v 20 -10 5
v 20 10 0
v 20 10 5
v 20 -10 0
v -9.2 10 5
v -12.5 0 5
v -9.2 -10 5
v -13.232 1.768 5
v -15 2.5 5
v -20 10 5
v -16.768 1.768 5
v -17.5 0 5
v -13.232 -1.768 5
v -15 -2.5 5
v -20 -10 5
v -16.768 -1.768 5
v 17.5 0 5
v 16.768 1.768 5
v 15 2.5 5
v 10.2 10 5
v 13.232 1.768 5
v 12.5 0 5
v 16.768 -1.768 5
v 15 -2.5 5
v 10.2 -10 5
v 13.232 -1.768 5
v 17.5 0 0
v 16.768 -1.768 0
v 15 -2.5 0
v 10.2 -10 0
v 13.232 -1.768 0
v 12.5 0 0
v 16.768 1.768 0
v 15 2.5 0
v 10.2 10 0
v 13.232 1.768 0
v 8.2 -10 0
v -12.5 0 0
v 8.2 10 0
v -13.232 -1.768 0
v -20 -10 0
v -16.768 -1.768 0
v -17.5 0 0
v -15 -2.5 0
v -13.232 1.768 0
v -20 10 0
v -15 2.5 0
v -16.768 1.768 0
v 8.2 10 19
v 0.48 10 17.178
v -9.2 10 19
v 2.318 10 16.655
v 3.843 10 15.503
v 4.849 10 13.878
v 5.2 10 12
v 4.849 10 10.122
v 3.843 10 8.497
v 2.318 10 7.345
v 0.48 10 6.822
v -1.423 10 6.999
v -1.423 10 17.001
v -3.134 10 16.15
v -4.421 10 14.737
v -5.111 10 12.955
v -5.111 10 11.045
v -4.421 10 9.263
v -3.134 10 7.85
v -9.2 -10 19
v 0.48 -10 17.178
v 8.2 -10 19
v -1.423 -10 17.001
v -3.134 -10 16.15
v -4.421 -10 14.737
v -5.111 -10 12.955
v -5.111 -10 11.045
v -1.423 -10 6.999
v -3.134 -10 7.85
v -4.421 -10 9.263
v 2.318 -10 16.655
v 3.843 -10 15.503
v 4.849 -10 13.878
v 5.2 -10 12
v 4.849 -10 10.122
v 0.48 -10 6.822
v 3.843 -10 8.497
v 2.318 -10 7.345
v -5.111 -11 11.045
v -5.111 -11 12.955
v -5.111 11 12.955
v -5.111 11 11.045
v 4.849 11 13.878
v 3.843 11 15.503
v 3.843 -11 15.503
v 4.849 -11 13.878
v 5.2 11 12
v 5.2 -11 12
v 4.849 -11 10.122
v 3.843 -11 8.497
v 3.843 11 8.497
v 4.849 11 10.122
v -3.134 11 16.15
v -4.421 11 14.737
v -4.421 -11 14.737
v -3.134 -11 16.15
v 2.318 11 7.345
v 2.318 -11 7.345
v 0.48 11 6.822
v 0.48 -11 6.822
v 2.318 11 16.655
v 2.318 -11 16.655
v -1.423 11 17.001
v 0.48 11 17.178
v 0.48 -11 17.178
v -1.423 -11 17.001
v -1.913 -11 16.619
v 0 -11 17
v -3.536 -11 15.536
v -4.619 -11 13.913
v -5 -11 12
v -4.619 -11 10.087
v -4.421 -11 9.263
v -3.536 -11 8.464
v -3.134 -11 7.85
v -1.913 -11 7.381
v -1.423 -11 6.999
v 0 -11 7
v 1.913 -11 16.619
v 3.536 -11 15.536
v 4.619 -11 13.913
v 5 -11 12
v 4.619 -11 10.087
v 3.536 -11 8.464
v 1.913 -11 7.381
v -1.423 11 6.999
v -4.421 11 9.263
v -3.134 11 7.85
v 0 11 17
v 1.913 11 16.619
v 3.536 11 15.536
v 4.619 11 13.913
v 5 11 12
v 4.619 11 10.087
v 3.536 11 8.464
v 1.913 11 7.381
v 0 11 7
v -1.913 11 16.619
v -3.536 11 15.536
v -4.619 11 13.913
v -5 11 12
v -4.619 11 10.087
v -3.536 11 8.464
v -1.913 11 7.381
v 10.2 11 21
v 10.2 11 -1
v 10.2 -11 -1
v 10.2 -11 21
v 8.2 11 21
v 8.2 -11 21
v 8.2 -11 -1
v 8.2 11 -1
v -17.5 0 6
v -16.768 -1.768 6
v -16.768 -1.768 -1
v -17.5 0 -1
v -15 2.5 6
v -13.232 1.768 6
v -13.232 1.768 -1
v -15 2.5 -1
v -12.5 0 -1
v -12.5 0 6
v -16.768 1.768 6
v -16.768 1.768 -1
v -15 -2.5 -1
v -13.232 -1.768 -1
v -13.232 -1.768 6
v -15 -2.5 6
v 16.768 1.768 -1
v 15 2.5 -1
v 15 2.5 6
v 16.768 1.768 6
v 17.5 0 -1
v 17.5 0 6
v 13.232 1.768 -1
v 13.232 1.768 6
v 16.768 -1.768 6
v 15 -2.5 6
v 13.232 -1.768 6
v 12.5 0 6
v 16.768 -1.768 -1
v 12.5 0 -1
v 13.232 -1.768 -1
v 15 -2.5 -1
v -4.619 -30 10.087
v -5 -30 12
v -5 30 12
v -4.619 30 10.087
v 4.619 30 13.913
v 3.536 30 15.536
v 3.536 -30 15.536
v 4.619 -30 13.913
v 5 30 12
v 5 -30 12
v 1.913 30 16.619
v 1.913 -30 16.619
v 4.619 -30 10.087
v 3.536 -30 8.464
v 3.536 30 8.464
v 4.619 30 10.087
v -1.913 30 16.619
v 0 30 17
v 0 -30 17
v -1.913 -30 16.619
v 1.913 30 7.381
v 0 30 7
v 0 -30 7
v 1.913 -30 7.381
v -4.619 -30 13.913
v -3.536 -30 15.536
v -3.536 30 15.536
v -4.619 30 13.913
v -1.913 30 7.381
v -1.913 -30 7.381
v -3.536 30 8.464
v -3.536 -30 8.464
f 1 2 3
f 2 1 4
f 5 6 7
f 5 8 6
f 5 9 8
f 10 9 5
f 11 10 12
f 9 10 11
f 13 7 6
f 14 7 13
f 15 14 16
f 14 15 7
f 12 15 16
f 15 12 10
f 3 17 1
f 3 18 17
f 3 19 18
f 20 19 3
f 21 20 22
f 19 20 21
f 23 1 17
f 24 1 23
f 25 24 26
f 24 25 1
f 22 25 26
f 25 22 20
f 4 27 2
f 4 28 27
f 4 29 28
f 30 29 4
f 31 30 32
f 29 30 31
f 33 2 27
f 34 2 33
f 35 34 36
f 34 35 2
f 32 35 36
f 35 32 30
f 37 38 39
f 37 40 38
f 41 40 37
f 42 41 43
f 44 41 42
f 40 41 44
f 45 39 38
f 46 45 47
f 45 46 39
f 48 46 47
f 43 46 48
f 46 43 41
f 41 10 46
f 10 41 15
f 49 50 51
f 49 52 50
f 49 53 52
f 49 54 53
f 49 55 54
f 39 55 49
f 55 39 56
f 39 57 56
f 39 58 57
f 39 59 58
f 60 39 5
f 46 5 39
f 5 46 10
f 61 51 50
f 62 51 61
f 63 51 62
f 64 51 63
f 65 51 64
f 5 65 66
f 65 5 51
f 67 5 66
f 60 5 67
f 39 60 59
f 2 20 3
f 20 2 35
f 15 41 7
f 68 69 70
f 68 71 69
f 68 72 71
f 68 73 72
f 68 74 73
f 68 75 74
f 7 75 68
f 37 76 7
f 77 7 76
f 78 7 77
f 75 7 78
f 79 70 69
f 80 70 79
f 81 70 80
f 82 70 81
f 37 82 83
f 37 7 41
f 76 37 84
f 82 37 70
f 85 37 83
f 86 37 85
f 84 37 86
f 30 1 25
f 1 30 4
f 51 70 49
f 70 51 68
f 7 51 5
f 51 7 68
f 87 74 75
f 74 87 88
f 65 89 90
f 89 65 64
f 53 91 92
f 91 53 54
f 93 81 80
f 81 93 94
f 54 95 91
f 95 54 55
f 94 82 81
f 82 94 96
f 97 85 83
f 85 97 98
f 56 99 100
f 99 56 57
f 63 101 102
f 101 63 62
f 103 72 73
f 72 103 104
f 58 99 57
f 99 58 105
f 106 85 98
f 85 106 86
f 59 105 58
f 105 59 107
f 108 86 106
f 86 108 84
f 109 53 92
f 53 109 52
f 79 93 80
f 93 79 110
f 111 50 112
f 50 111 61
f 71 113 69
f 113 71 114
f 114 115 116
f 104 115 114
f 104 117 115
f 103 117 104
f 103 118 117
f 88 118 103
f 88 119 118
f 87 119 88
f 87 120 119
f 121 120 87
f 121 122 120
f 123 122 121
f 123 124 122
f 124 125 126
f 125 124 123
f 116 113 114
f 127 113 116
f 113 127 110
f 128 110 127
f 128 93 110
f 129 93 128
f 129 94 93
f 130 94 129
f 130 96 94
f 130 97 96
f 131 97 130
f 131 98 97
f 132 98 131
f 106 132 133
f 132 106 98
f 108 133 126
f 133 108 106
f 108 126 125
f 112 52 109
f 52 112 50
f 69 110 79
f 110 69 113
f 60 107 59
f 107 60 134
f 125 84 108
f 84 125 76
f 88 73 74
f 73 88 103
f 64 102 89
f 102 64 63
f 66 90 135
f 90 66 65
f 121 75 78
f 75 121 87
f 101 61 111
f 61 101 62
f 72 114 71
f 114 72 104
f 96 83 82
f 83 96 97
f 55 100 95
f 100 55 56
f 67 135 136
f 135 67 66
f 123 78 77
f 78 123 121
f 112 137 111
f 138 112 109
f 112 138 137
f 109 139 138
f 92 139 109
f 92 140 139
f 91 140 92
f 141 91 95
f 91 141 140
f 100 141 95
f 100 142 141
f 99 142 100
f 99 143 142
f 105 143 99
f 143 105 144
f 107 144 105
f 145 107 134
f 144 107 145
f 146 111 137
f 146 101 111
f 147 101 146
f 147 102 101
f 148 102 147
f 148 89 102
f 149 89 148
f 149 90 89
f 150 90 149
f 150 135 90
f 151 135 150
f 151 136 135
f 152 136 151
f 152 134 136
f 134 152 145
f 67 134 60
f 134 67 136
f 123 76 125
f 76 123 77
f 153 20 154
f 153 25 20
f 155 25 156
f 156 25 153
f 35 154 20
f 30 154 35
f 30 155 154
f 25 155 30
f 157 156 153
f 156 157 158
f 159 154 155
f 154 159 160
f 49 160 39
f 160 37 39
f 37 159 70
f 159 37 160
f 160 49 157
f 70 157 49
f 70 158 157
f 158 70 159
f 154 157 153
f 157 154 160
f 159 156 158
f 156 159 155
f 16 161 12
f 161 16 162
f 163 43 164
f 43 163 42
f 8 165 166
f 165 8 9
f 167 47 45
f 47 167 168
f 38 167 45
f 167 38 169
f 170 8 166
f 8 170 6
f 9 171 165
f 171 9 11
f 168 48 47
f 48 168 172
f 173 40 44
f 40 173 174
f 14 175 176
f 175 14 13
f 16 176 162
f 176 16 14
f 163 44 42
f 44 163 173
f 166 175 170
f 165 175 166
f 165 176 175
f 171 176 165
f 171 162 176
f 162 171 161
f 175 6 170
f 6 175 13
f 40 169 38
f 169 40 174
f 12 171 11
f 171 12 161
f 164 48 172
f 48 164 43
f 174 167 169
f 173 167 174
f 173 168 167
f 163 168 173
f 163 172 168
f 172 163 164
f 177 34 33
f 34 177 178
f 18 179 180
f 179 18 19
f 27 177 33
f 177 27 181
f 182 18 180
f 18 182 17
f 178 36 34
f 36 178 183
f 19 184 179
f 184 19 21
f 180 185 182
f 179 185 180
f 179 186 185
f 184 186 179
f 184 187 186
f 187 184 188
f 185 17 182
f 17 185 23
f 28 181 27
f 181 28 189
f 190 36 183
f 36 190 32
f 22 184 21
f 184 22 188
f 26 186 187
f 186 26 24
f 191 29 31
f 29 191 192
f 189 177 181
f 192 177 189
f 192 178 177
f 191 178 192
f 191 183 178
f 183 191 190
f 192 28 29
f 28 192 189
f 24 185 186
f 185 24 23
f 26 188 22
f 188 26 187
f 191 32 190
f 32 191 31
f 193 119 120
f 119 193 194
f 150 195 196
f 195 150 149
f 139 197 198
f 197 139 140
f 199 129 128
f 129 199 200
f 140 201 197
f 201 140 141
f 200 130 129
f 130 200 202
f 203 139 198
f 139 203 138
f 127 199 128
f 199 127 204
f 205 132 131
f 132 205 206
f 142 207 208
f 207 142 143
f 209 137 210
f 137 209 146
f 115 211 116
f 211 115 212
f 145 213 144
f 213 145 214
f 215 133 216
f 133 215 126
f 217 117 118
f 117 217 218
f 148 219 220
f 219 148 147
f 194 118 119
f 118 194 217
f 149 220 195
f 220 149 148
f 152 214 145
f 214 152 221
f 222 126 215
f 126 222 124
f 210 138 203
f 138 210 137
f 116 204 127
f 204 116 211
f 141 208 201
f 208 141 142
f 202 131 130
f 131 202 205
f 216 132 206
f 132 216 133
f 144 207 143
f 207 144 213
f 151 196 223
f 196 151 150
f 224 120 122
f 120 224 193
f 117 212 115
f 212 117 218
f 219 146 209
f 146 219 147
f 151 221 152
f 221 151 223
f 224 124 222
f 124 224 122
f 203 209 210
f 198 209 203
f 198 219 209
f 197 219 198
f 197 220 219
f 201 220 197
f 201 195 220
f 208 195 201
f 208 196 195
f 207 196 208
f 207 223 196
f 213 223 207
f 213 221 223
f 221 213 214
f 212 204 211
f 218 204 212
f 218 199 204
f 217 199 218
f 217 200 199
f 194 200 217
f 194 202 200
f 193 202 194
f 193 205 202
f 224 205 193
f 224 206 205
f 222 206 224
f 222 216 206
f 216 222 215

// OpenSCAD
// Parameters
rod_diameter = 10.0; //[5.0:20.0:0.1]
rod_length = 60.0; //[30.0:120.0:1]
overall_height = 20.0; //[10.0:40.0:0.5]
fit_clearance = 0.2; //[0.0:0.6:0.05]
wall_thickness = 4.0; //[2.0:8.0:0.5]
base_thickness = 5.0; //[2.5:10.0:0.5]
base_length = 40.0; //[20.0:80.0:1]
base_width = 20.0; //[10.0:40.0:1]
mount_hole_diameter = 5.0; //[3.0:8.0:0.1]
mount_hole_spacing = 30.0; //[15.0:60.0:1]
mount_hole_edge_margin = 5.0; //[3.0:12.0:0.5]
bore_center_height_from_base = 12.0; //[6.0:24.0:0.5]
clamp_gap = 2.0; //[0.5:5.0:0.25]
overlap = 1.0; //[0.5:2.0:0.1]

// SK10 Bracket - complete geometry
module sk_bracket() {
  color("Silver") {
    // Mounting base
    translate([0, 0, base_thickness/2])
      cube([base_length, base_width, base_thickness], center=true);
    
    // Main body
    translate([0, 0, base_thickness + (overall_height - base_thickness)/2 - overlap])
      cube([2*(rod_diameter/2 + fit_clearance + wall_thickness), base_width, overall_height - base_thickness], center=true);
    
    // Rod support bore
    translate([0, 0, bore_center_height_from_base])
      rotate([90, 0, 0])
      cylinder(r=rod_diameter/2 + fit_clearance, h=base_width + 2*overlap, center=true);
    
    // Clamp split
    translate([(rod_diameter/2 + fit_clearance + wall_thickness) - clamp_gap/2 + overlap, 0, overall_height/2])
      cube([clamp_gap, base_width + 2*overlap, overall_height + 2*overlap], center=true);
    
    // Mounting holes
    translate([-mount_hole_spacing/2, 0, base_thickness/2])
      cylinder(r=mount_hole_diameter/2, h=base_thickness + 2*overlap, center=true);
    translate([mount_hole_spacing/2, 0, base_thickness/2])
      cylinder(r=mount_hole_diameter/2, h=base_thickness + 2*overlap, center=true);
  }
}

// Rod - complete geometry
module rod() {
  color("DimGray") {
    translate([0, 0, bore_center_height_from_base])
      rotate([90, 0, 0])
      cylinder(r=rod_diameter/2, h=rod_length, center=true);
  }
}

// Assembly
module assembly() {
  sk_bracket();
  rod();
}

assembly();
